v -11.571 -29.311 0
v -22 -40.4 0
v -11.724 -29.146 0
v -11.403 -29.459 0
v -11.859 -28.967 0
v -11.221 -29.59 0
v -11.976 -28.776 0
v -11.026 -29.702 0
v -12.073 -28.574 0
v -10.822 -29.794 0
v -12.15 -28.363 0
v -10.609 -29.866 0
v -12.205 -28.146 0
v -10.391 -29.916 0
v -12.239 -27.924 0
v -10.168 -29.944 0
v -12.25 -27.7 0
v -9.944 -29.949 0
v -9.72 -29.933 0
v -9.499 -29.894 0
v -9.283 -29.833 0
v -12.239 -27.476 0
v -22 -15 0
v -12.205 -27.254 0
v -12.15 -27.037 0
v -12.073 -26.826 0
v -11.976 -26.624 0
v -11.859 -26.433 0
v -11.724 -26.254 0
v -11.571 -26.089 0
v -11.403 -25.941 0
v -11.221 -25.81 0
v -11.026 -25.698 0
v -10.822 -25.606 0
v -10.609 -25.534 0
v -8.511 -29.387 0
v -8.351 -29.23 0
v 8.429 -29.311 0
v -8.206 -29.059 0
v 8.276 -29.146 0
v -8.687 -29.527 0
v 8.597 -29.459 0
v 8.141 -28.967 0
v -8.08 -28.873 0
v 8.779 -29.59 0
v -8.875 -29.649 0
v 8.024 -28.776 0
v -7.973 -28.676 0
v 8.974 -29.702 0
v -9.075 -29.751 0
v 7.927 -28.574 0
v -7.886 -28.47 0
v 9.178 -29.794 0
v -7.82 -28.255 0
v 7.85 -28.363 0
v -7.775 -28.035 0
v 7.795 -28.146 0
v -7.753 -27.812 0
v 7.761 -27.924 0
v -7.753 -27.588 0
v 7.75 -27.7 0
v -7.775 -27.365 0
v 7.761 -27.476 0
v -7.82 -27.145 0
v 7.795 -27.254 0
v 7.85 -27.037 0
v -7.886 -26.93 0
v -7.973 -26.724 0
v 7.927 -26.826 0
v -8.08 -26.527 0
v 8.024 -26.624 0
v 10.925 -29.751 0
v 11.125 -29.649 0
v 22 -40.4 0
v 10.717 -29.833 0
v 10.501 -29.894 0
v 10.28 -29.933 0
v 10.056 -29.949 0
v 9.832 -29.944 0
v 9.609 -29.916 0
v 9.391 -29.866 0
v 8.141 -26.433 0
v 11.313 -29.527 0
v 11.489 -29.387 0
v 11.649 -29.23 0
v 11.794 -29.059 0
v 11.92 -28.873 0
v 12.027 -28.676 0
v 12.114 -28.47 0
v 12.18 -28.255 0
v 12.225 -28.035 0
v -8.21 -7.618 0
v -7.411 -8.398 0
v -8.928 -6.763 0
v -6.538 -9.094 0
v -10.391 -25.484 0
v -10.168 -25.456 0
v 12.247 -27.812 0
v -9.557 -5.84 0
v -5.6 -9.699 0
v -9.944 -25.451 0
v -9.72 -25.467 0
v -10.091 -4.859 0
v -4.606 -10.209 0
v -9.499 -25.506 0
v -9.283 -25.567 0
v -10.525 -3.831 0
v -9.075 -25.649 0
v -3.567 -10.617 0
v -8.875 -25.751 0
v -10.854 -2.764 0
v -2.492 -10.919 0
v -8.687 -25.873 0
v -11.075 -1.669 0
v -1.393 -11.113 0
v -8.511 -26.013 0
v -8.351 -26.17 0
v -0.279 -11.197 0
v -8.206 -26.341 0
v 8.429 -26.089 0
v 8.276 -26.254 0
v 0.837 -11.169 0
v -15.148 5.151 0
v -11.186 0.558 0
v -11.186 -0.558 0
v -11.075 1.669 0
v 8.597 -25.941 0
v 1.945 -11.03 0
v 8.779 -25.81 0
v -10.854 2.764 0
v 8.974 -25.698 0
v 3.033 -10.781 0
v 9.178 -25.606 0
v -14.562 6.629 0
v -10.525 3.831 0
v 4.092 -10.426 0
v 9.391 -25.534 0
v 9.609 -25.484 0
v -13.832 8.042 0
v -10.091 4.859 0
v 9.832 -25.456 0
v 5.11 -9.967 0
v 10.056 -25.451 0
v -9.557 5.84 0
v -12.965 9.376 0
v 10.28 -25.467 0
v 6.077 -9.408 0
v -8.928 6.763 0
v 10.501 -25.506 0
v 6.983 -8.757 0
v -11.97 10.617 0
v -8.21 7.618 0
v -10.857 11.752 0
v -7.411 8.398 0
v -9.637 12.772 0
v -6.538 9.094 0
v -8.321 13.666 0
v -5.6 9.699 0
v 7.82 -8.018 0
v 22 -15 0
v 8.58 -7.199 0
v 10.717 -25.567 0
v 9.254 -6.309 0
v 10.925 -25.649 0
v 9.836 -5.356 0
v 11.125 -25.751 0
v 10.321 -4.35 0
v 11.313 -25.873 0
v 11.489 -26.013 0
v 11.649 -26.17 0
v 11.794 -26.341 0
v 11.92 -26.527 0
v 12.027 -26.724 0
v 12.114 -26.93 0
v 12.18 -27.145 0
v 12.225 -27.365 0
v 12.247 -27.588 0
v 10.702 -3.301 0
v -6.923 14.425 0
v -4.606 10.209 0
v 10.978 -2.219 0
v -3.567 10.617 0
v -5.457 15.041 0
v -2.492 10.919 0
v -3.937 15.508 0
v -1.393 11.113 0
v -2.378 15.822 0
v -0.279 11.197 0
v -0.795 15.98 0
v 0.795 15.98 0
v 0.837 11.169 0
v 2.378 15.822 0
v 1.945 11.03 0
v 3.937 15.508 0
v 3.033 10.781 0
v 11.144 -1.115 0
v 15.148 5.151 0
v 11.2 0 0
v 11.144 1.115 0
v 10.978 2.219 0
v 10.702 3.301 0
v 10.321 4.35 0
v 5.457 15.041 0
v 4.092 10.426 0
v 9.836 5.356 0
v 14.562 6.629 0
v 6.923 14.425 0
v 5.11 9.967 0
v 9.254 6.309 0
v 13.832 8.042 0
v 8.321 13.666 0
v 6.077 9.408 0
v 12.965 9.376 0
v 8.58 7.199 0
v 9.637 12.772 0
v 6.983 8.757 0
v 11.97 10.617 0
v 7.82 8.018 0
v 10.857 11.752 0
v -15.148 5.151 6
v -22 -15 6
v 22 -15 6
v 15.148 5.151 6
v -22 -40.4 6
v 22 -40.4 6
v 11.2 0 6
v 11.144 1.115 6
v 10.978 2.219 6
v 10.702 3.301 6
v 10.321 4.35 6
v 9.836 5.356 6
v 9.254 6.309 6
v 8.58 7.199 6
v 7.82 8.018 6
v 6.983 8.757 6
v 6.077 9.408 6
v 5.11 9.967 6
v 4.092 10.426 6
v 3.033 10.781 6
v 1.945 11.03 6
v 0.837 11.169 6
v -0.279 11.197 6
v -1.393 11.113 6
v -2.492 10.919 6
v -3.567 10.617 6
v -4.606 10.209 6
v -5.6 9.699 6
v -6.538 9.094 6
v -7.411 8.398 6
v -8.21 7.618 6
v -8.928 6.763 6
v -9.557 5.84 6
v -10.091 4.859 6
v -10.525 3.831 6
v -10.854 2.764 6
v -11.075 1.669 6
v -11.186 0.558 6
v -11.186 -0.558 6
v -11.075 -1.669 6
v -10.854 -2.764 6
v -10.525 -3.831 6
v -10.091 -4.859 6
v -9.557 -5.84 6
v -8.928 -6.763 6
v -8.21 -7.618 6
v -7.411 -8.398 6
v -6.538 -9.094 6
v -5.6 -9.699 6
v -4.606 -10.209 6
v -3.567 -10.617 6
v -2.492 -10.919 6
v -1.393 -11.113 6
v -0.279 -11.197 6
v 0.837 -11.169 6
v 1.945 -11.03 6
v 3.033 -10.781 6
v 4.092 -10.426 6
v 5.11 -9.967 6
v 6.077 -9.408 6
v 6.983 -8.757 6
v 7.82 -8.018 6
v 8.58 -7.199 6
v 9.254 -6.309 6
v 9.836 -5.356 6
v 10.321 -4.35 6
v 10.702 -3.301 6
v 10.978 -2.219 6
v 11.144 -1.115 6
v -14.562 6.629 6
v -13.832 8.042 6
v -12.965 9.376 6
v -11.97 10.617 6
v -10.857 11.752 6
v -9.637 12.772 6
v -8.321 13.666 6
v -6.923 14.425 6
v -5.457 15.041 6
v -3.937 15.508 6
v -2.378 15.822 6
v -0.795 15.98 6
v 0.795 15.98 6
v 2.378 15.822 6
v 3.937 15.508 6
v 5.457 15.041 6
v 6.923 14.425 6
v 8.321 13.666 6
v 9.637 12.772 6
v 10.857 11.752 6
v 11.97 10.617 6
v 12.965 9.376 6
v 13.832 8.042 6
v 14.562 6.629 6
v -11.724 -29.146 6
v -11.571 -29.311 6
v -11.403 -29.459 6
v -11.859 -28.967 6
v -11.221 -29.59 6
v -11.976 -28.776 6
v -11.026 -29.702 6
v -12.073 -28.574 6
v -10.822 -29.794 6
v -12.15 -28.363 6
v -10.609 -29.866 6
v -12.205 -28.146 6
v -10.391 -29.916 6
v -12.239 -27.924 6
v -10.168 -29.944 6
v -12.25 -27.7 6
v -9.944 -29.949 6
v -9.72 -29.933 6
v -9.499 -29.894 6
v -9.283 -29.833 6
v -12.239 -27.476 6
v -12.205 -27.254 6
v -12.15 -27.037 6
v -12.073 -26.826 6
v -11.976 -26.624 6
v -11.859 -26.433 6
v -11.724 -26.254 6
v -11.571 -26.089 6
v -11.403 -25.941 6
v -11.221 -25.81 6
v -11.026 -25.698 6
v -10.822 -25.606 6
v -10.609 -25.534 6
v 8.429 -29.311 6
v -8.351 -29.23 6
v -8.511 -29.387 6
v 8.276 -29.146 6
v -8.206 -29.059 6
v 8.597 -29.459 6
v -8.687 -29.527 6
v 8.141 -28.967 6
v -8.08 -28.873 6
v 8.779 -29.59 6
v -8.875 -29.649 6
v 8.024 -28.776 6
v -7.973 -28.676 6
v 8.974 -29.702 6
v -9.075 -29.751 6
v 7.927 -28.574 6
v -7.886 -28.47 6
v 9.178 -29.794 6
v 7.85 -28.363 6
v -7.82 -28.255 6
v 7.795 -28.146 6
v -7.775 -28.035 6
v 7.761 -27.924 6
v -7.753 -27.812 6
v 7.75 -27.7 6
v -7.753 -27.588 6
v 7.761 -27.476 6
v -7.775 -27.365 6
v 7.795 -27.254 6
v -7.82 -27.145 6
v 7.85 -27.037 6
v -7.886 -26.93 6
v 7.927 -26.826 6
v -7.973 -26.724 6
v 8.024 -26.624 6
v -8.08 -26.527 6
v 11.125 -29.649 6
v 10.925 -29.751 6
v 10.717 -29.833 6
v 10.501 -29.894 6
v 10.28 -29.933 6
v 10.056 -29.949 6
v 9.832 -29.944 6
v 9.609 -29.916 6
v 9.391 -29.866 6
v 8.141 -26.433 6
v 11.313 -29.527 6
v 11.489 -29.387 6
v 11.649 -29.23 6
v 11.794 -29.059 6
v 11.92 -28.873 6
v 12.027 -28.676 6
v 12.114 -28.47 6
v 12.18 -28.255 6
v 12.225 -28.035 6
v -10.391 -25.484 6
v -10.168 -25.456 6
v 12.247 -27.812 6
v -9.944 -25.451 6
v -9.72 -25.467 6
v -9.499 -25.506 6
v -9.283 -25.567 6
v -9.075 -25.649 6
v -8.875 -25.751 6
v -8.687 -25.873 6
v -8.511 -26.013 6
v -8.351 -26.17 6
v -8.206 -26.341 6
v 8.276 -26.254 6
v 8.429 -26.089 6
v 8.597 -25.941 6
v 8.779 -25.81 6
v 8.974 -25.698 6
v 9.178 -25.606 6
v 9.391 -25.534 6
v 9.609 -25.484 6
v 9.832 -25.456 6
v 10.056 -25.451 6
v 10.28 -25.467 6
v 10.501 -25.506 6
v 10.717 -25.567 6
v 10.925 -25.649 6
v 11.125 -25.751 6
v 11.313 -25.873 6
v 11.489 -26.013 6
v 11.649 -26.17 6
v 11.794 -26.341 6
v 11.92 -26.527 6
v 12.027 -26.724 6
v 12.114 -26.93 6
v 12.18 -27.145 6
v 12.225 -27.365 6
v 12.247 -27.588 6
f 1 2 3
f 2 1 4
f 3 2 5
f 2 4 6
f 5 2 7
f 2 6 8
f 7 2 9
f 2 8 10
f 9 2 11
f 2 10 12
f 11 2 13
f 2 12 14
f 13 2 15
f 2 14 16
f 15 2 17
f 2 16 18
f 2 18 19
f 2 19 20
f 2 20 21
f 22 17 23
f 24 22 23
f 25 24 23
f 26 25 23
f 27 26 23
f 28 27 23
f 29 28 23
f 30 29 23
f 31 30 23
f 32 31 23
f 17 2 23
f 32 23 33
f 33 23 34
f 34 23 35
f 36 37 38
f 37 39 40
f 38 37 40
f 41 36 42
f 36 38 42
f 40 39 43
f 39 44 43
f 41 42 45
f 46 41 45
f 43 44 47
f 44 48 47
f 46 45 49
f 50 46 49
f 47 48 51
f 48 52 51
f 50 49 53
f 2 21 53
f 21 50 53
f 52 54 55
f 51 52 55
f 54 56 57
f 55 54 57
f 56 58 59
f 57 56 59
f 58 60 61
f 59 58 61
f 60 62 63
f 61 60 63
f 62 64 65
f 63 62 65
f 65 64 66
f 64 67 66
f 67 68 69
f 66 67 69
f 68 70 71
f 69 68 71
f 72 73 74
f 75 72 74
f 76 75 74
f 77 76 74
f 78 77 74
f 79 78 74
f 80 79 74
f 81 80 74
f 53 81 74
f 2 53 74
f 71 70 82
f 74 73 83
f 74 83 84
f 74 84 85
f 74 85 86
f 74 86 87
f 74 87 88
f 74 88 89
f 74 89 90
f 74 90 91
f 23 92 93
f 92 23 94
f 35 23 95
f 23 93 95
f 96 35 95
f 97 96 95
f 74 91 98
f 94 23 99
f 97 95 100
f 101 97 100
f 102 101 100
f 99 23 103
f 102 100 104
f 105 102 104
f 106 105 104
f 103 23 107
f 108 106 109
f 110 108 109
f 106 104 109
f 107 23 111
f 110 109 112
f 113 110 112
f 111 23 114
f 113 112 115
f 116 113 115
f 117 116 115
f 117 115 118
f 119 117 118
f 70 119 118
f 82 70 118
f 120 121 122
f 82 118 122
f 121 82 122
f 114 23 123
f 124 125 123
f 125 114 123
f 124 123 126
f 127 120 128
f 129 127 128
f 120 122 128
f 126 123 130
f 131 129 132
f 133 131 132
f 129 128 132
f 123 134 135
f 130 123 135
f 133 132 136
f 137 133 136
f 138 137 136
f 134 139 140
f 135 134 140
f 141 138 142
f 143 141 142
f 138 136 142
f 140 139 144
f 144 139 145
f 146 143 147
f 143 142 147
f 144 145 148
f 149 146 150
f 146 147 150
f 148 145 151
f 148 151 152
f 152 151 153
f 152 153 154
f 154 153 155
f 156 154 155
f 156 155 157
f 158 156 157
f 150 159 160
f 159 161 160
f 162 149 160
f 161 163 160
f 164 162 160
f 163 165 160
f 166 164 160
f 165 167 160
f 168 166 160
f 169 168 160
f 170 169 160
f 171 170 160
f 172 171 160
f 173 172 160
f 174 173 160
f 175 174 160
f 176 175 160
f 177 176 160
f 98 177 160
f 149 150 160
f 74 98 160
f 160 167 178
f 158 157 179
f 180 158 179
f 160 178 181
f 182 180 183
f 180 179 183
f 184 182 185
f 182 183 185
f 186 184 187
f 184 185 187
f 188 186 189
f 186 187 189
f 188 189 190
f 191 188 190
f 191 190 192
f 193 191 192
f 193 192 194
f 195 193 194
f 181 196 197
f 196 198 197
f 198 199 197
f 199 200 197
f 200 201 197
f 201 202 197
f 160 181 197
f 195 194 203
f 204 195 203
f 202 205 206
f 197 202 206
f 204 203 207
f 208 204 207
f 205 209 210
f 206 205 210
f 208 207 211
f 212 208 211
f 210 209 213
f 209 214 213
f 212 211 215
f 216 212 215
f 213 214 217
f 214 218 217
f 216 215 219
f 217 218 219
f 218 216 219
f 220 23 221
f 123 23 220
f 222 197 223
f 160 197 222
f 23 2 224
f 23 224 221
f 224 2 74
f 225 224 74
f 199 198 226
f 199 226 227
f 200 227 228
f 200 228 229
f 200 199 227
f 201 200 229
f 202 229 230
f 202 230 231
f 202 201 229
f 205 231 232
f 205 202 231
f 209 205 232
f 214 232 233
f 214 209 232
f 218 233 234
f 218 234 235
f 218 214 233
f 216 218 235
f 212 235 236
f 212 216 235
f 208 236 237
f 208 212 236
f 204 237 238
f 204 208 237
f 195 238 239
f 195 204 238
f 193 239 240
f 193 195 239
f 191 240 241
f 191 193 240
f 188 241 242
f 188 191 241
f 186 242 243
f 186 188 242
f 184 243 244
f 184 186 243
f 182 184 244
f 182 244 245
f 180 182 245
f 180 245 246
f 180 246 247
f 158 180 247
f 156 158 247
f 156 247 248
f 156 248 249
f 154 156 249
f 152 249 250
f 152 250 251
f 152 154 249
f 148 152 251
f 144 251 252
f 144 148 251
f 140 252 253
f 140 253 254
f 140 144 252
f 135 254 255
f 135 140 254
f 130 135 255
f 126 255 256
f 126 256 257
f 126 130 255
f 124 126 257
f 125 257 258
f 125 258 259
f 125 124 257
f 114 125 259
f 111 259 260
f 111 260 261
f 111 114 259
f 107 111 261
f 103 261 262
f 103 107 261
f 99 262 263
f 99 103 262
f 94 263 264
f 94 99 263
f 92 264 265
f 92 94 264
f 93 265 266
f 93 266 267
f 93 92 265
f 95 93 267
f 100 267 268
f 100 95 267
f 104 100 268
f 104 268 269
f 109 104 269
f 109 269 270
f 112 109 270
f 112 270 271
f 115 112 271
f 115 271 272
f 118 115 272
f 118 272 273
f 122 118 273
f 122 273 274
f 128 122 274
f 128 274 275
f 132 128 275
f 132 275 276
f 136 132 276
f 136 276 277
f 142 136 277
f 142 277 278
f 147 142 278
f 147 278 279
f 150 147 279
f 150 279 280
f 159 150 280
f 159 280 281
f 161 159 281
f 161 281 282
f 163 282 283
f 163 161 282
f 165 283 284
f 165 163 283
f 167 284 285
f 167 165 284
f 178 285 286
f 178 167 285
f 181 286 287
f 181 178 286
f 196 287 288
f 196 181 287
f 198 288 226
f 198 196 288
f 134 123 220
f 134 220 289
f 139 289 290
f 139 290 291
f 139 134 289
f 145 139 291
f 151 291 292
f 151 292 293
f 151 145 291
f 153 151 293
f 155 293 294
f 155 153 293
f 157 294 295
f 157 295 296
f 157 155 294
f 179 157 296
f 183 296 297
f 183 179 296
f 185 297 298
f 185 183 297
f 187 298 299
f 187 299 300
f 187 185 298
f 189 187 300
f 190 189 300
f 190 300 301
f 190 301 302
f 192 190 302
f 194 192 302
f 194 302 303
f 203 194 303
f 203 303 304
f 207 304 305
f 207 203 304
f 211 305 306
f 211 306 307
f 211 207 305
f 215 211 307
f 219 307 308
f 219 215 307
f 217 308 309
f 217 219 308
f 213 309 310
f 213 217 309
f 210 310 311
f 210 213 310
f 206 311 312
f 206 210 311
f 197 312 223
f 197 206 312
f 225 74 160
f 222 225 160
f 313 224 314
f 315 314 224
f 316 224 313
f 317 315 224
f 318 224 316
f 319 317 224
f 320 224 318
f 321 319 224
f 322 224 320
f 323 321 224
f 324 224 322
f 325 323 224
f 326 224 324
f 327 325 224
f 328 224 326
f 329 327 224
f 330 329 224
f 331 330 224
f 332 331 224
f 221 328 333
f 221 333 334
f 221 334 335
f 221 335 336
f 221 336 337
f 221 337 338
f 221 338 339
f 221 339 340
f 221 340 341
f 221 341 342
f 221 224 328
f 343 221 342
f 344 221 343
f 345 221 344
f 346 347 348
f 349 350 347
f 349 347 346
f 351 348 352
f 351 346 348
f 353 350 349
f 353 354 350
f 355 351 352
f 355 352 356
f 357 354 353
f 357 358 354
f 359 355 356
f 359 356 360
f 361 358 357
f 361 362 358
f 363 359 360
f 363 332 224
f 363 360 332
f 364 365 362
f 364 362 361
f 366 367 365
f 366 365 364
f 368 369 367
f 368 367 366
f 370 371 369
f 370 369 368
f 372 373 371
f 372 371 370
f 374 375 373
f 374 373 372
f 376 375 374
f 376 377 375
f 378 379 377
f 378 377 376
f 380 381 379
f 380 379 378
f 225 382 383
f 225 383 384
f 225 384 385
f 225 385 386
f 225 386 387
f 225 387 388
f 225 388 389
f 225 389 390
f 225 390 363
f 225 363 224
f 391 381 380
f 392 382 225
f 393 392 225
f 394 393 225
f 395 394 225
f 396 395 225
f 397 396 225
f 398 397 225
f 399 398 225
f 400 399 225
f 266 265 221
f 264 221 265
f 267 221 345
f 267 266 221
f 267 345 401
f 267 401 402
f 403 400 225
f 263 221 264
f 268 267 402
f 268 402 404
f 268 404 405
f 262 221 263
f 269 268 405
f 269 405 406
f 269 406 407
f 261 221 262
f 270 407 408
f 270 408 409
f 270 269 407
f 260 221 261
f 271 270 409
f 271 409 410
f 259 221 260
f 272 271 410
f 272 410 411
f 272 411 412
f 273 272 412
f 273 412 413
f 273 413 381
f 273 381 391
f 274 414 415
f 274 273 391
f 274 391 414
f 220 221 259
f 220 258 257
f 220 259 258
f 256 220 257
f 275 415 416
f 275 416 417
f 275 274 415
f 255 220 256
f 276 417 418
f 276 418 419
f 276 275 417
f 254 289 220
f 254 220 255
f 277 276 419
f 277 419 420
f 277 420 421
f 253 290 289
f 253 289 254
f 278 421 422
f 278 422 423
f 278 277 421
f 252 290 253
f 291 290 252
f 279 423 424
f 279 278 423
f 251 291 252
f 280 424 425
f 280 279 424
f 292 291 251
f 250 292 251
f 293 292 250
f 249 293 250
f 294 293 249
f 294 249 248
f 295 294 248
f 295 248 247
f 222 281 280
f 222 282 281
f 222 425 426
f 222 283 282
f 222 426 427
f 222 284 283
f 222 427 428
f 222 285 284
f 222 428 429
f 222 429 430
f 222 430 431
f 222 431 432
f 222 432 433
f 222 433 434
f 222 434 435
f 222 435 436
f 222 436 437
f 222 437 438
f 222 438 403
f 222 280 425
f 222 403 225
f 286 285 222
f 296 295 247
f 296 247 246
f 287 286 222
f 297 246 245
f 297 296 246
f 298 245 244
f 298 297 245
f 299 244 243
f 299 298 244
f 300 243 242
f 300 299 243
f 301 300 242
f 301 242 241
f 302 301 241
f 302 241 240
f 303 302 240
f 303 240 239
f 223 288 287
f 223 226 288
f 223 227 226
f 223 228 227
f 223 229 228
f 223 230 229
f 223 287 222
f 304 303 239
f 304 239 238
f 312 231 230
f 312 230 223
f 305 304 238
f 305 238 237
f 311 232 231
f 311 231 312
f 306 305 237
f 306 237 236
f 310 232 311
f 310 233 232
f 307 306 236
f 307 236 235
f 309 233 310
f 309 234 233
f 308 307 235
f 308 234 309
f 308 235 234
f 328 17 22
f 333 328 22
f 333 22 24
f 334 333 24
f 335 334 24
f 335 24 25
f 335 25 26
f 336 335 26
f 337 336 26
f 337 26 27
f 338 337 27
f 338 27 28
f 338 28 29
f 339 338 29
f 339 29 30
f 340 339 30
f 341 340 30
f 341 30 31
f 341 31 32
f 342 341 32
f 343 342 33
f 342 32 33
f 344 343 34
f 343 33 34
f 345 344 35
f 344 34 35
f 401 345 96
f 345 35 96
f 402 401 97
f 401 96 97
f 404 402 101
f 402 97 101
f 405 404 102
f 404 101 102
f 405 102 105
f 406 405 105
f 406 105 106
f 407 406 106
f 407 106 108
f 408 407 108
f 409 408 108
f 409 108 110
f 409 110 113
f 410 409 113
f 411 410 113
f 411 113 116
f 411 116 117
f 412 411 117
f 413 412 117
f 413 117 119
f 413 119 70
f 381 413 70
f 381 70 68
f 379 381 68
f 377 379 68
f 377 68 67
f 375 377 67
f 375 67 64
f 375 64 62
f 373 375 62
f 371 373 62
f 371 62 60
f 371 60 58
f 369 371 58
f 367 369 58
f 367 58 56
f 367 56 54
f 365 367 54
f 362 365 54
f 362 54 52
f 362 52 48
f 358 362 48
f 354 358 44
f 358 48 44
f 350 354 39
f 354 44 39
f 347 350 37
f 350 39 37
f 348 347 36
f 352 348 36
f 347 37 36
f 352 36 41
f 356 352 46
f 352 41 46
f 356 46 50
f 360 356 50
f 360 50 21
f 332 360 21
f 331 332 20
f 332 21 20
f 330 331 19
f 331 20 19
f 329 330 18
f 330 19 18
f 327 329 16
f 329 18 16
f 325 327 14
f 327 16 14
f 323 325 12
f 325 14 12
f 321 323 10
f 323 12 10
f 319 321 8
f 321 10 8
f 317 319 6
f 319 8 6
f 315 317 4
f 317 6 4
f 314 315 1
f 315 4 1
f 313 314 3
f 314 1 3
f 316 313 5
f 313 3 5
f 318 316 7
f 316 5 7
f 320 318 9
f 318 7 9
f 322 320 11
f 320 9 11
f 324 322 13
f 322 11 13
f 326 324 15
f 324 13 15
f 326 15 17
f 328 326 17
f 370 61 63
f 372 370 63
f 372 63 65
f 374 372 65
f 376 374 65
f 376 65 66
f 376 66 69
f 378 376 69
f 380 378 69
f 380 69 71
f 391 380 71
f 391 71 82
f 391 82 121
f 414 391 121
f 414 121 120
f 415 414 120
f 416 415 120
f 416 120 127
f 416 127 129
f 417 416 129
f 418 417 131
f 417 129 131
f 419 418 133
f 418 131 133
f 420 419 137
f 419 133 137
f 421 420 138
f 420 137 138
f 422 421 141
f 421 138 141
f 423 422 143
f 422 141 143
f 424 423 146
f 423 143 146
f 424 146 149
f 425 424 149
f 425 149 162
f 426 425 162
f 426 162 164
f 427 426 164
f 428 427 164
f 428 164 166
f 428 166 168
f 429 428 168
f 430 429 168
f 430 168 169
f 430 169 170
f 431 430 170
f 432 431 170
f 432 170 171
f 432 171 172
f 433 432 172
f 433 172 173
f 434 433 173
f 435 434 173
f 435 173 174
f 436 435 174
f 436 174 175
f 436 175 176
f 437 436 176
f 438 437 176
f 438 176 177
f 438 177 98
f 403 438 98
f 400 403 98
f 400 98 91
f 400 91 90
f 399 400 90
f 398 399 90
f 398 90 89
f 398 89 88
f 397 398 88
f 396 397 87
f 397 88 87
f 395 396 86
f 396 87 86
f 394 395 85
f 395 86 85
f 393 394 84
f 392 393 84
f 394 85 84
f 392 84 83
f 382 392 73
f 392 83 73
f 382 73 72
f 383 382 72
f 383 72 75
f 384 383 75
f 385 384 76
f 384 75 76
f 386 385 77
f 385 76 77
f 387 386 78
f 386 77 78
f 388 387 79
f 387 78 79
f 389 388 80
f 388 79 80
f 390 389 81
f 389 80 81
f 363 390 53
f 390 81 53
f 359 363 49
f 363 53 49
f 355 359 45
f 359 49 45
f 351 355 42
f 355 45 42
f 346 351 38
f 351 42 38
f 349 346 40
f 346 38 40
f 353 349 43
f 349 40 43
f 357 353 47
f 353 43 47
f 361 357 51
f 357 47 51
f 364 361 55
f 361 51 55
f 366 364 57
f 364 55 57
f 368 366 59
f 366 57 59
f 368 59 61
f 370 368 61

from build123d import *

# Parameters (mm, degrees)
SKETCH1_R            = 11.2
SKETCH1_W            = 44
SKETCH1_H            = 25.4
BOSS_EXTRUDE1_DEPTH  = 6
M4_CLEARANCE_HOLE1_D = 4.5


with BuildPart() as part:
    # Sketch1 → Boss-Extrude1 (new body)
    # profile 1 of 2: a face of its own
    with BuildSketch(Plane.XY):
        with BuildLine():
            ThreePointArc((-15.148252746, 5.150770694), (0, 16), (15.148252746, 5.150770694))
            Line((15.148252746, 5.150770694), (22, -15))
            Line((22, -15), (-22, -15))
            Line((-22, -15), (-15.148252746, 5.150770694))
        make_face()
        Circle(SKETCH1_R, mode=Mode.SUBTRACT)
    # profile 2 of 2: a face of its own
    with BuildSketch(Plane.XY):
        with Locations((0, -27.7)):
            Rectangle(SKETCH1_W, SKETCH1_H)
    extrude(amount=BOSS_EXTRUDE1_DEPTH)

    # M4 Clearance Hole1 (through all)
    with Locations(Plane.XY.offset(6)):
        with Locations((-10, -27.7), (10, -27.7)):
            Hole(M4_CLEARANCE_HOLE1_D / 2)


solid = part.part
